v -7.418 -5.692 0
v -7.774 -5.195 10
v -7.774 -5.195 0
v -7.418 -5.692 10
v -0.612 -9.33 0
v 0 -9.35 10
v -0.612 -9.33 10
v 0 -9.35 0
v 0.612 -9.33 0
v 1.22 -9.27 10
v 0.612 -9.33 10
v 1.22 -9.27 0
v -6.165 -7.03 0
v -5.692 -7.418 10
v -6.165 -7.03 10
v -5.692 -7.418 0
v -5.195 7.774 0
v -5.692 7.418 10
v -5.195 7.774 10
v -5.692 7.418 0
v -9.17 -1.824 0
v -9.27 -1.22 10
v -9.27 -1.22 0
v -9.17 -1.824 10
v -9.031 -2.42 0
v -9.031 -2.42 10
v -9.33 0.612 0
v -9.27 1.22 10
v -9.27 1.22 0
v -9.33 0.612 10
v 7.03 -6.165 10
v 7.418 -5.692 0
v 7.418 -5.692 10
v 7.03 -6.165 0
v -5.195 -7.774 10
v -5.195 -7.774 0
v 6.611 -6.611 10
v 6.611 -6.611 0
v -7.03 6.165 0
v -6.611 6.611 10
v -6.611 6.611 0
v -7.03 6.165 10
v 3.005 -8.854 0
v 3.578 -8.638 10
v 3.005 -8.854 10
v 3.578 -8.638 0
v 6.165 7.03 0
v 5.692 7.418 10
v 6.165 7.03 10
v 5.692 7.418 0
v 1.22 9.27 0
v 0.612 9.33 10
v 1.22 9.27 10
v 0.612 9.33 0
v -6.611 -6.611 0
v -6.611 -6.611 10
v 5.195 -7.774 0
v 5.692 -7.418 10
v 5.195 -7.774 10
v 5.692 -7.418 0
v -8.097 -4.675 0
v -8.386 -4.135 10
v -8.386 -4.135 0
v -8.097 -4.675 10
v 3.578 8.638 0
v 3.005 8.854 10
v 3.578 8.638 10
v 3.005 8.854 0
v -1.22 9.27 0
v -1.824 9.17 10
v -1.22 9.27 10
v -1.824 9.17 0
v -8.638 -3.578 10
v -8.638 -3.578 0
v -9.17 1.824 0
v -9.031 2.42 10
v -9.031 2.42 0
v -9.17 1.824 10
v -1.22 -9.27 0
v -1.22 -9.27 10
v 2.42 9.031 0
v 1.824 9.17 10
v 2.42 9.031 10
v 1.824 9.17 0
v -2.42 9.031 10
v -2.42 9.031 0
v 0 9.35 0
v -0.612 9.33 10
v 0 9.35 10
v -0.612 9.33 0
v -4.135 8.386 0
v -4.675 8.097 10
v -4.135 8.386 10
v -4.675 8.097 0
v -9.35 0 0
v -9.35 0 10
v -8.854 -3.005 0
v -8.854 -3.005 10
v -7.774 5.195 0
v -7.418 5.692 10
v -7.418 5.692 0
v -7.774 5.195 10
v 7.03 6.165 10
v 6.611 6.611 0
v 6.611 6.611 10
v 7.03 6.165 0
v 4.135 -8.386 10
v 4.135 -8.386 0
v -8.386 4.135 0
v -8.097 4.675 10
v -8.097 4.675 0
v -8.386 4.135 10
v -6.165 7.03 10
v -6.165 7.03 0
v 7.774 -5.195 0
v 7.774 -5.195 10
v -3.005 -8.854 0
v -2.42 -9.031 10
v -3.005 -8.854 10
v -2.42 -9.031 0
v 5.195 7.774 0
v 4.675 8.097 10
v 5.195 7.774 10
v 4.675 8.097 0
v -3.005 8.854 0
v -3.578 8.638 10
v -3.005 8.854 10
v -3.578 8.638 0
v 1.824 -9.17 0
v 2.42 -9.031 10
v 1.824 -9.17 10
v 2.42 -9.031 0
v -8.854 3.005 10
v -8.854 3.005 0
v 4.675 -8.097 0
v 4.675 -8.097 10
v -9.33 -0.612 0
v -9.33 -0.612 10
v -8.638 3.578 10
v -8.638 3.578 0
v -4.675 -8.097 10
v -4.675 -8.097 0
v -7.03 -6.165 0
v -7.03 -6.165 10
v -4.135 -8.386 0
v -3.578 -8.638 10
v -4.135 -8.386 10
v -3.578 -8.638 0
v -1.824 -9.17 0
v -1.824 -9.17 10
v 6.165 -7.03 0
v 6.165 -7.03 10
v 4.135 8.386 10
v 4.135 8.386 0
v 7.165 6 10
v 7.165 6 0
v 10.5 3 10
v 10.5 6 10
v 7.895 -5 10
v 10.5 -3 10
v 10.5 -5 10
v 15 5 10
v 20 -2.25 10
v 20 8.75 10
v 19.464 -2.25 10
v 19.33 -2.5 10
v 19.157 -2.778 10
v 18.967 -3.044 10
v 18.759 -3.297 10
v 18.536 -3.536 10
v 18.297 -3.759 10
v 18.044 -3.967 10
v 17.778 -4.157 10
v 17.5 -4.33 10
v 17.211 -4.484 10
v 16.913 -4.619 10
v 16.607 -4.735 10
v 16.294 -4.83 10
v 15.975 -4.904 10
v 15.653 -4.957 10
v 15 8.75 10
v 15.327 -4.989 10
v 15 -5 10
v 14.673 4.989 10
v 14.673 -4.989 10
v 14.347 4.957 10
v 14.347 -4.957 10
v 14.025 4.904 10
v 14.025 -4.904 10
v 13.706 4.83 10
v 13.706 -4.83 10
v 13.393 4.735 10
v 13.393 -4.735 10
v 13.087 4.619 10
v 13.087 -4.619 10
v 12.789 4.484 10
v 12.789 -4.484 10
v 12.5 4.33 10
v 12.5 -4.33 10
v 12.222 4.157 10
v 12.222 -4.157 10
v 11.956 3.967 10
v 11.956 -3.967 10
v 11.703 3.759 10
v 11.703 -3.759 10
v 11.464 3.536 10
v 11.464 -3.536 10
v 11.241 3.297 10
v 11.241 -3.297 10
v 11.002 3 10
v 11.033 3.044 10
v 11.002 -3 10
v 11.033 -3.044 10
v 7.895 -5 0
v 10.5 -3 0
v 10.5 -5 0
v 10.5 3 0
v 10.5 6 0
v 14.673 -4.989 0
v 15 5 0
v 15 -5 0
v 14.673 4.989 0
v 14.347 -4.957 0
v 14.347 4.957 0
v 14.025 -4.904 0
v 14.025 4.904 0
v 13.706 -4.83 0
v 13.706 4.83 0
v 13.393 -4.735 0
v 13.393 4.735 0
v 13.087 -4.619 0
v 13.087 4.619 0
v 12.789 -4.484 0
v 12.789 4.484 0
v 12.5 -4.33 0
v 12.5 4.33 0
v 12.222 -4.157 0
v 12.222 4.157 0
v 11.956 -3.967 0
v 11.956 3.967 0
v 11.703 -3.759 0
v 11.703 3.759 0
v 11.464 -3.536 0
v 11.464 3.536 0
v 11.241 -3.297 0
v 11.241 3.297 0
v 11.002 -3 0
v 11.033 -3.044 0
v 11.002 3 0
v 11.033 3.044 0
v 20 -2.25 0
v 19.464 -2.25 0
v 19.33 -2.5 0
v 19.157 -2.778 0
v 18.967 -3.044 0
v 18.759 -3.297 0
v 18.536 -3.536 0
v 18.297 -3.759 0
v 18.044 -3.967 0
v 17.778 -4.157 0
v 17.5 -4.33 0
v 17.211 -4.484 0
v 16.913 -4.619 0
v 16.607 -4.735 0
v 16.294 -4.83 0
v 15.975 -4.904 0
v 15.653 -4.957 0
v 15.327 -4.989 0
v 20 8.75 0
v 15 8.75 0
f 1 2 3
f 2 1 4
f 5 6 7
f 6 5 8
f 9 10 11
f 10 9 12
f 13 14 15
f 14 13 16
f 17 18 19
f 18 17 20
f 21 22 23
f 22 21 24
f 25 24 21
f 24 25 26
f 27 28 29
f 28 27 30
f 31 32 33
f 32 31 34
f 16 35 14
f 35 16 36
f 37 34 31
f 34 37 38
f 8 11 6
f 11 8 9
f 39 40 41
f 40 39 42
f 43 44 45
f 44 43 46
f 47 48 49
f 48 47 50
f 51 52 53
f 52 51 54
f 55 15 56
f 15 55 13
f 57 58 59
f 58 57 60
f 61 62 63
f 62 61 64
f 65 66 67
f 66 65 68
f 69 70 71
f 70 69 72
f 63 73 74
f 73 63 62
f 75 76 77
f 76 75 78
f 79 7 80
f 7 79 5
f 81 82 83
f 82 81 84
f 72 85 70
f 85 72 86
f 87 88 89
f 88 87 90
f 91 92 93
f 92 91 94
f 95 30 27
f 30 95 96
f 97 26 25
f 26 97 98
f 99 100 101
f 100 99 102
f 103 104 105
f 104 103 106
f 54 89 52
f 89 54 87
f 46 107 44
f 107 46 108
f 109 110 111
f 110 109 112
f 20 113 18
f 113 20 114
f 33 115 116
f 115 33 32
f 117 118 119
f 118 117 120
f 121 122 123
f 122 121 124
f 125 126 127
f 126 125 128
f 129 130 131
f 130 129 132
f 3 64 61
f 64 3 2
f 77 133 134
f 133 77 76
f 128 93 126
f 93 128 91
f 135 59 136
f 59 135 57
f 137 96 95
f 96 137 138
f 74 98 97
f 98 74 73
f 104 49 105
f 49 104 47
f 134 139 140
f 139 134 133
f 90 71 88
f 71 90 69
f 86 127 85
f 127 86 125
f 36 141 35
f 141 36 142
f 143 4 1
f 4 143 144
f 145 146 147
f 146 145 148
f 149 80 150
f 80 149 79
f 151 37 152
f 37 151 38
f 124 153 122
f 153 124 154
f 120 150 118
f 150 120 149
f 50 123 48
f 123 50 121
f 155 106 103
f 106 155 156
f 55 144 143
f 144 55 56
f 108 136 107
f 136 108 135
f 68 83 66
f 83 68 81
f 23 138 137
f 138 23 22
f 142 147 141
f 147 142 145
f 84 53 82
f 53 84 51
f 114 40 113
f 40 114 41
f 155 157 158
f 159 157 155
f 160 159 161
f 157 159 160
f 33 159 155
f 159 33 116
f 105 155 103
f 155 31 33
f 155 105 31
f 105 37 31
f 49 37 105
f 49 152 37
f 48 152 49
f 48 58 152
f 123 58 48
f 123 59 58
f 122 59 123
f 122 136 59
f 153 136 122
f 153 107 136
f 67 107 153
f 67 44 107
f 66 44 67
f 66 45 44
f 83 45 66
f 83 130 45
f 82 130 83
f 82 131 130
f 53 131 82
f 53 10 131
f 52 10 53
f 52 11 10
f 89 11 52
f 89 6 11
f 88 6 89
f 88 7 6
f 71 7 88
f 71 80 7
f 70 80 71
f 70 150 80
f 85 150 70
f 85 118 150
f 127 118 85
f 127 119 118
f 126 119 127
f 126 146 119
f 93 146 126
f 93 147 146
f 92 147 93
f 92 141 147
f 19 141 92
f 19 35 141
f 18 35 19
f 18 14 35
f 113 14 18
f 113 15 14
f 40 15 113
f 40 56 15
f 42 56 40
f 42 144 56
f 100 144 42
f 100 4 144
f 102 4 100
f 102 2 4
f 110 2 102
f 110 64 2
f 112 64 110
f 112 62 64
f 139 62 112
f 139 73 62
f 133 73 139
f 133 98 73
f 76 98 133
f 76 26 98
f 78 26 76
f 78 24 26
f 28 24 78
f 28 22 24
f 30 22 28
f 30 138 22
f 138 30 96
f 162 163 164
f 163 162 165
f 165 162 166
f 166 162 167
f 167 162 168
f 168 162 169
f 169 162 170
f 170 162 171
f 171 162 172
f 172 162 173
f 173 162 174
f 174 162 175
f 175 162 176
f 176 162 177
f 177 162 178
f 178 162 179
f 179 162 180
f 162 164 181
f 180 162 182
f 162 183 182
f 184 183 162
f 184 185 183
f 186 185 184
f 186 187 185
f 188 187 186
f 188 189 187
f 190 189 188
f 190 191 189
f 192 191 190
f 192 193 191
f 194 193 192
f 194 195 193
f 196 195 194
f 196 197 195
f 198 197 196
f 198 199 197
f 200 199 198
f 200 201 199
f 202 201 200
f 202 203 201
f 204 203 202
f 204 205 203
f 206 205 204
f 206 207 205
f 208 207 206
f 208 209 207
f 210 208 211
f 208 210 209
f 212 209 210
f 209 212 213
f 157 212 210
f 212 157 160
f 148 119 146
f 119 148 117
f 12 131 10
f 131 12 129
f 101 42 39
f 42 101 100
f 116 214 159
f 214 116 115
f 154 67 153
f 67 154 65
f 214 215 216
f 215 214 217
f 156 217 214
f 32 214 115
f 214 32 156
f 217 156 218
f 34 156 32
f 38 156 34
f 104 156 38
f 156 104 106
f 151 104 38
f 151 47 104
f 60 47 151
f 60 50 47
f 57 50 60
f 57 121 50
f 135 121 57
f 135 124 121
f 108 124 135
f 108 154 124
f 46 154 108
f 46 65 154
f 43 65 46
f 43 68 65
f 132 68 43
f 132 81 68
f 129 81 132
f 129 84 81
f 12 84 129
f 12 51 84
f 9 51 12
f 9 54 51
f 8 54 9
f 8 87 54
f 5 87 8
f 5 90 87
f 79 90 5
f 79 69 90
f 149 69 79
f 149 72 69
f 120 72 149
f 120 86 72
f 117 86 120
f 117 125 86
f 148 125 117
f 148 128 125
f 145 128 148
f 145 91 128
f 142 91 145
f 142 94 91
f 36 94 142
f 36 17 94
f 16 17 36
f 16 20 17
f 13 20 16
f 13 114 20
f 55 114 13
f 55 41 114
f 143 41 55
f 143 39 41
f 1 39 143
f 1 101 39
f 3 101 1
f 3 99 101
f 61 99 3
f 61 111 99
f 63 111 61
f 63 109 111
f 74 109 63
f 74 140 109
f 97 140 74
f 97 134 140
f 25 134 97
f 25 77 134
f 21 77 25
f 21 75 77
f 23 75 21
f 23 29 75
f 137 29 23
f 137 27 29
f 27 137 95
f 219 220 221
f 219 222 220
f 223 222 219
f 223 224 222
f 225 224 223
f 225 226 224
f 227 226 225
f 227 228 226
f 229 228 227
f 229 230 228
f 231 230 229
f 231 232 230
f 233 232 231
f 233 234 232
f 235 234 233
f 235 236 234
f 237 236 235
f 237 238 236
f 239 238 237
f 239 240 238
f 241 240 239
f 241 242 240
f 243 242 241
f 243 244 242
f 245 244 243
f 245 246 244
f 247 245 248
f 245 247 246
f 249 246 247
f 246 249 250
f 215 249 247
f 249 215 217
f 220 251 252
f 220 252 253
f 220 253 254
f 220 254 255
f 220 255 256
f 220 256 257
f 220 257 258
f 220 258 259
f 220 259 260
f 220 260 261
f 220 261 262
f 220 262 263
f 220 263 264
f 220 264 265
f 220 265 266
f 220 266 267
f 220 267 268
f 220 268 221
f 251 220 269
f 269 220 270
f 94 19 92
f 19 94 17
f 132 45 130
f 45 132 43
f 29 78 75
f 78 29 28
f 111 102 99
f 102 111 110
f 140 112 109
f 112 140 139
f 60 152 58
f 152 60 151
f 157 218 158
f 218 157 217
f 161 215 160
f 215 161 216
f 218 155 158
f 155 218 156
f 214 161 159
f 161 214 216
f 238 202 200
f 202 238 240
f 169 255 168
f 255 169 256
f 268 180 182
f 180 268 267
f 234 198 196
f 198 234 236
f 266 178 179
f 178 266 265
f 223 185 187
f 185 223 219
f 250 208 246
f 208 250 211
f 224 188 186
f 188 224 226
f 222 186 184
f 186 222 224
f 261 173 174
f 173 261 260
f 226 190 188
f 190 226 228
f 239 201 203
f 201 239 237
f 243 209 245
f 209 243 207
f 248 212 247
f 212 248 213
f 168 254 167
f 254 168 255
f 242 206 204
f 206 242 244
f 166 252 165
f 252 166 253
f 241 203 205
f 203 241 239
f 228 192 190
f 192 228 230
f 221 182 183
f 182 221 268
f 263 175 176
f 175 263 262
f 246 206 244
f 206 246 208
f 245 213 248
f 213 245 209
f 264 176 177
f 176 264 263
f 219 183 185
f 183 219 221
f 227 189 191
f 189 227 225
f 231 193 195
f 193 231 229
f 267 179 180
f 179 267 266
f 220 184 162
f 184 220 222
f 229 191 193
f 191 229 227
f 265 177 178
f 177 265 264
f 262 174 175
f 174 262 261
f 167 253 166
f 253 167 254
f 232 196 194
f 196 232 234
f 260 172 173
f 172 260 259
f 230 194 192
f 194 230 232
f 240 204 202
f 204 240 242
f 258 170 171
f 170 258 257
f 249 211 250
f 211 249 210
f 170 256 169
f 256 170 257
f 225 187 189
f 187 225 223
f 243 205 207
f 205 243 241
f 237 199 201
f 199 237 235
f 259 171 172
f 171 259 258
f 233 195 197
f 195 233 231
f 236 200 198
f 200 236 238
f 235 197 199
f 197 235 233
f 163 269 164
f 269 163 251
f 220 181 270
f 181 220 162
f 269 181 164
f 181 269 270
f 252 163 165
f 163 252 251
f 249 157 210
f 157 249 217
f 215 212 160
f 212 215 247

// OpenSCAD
// Snap-on clip for tubing next to a 12.7 mm (1/2 inch) lab stand rod
// Print orientation: flat on the bed, extruded along +Z

$fn = 96;

// ---- Dimensions (mm) ----
rod_id        = 12.7;   // stand rod inner diameter
ring_w        = 3;      // rod ring wall thickness
ring_od       = rod_id + 2 * ring_w;  // 18.7 mm outer diameter
ring_opening  = 10;     // width of the cut-out on the -X side

tubing_id     = 6;      // tubing ring inner diameter
tubing_w      = 2;      // tubing ring wall thickness
tubing_od     = tubing_id + 2 * tubing_w;  // 10 mm outer diameter
tubing_x      = 15;     // tubing ring centre X
tubing_open   = 4.5;    // width of the +X side cut-out

bridge_w      = 6;      // bridge width along Y
bridge_x0     = 8;      // bridge start X
bridge_x1     = 12;     // bridge end X

eps           = 0.5;    // overcut for clean boolean differences

// ---- Model ----
difference() {
    union() {
        // Rod ring
        cylinder(h = 10, d = ring_od);
        // Rod ring opening (removes everything with x < 0 and -5 < y < 5)
        translate([0, -5, 0])
            cube([ring_opening + eps, 10 + 2 * eps, 10]);

        // Tubing ring
        translate([tubing_x, 0, 0])
            cylinder(h = 10, d = tubing_od);
        // Tubing ring opening (removes x > 15 and -2.25 < y < 2.25)
        translate([tubing_x, -tubing_open / 2, 0])
            cube([tubing_open + eps, 10 + 2 * eps, 10]);

        // Solid bridge between x = 8 and x = 12
        translate([bridge_x0, -bridge_w / 2, 0])
            cube([bridge_x1 - bridge_x0 + eps, bridge_w, 10]);
    }
}
